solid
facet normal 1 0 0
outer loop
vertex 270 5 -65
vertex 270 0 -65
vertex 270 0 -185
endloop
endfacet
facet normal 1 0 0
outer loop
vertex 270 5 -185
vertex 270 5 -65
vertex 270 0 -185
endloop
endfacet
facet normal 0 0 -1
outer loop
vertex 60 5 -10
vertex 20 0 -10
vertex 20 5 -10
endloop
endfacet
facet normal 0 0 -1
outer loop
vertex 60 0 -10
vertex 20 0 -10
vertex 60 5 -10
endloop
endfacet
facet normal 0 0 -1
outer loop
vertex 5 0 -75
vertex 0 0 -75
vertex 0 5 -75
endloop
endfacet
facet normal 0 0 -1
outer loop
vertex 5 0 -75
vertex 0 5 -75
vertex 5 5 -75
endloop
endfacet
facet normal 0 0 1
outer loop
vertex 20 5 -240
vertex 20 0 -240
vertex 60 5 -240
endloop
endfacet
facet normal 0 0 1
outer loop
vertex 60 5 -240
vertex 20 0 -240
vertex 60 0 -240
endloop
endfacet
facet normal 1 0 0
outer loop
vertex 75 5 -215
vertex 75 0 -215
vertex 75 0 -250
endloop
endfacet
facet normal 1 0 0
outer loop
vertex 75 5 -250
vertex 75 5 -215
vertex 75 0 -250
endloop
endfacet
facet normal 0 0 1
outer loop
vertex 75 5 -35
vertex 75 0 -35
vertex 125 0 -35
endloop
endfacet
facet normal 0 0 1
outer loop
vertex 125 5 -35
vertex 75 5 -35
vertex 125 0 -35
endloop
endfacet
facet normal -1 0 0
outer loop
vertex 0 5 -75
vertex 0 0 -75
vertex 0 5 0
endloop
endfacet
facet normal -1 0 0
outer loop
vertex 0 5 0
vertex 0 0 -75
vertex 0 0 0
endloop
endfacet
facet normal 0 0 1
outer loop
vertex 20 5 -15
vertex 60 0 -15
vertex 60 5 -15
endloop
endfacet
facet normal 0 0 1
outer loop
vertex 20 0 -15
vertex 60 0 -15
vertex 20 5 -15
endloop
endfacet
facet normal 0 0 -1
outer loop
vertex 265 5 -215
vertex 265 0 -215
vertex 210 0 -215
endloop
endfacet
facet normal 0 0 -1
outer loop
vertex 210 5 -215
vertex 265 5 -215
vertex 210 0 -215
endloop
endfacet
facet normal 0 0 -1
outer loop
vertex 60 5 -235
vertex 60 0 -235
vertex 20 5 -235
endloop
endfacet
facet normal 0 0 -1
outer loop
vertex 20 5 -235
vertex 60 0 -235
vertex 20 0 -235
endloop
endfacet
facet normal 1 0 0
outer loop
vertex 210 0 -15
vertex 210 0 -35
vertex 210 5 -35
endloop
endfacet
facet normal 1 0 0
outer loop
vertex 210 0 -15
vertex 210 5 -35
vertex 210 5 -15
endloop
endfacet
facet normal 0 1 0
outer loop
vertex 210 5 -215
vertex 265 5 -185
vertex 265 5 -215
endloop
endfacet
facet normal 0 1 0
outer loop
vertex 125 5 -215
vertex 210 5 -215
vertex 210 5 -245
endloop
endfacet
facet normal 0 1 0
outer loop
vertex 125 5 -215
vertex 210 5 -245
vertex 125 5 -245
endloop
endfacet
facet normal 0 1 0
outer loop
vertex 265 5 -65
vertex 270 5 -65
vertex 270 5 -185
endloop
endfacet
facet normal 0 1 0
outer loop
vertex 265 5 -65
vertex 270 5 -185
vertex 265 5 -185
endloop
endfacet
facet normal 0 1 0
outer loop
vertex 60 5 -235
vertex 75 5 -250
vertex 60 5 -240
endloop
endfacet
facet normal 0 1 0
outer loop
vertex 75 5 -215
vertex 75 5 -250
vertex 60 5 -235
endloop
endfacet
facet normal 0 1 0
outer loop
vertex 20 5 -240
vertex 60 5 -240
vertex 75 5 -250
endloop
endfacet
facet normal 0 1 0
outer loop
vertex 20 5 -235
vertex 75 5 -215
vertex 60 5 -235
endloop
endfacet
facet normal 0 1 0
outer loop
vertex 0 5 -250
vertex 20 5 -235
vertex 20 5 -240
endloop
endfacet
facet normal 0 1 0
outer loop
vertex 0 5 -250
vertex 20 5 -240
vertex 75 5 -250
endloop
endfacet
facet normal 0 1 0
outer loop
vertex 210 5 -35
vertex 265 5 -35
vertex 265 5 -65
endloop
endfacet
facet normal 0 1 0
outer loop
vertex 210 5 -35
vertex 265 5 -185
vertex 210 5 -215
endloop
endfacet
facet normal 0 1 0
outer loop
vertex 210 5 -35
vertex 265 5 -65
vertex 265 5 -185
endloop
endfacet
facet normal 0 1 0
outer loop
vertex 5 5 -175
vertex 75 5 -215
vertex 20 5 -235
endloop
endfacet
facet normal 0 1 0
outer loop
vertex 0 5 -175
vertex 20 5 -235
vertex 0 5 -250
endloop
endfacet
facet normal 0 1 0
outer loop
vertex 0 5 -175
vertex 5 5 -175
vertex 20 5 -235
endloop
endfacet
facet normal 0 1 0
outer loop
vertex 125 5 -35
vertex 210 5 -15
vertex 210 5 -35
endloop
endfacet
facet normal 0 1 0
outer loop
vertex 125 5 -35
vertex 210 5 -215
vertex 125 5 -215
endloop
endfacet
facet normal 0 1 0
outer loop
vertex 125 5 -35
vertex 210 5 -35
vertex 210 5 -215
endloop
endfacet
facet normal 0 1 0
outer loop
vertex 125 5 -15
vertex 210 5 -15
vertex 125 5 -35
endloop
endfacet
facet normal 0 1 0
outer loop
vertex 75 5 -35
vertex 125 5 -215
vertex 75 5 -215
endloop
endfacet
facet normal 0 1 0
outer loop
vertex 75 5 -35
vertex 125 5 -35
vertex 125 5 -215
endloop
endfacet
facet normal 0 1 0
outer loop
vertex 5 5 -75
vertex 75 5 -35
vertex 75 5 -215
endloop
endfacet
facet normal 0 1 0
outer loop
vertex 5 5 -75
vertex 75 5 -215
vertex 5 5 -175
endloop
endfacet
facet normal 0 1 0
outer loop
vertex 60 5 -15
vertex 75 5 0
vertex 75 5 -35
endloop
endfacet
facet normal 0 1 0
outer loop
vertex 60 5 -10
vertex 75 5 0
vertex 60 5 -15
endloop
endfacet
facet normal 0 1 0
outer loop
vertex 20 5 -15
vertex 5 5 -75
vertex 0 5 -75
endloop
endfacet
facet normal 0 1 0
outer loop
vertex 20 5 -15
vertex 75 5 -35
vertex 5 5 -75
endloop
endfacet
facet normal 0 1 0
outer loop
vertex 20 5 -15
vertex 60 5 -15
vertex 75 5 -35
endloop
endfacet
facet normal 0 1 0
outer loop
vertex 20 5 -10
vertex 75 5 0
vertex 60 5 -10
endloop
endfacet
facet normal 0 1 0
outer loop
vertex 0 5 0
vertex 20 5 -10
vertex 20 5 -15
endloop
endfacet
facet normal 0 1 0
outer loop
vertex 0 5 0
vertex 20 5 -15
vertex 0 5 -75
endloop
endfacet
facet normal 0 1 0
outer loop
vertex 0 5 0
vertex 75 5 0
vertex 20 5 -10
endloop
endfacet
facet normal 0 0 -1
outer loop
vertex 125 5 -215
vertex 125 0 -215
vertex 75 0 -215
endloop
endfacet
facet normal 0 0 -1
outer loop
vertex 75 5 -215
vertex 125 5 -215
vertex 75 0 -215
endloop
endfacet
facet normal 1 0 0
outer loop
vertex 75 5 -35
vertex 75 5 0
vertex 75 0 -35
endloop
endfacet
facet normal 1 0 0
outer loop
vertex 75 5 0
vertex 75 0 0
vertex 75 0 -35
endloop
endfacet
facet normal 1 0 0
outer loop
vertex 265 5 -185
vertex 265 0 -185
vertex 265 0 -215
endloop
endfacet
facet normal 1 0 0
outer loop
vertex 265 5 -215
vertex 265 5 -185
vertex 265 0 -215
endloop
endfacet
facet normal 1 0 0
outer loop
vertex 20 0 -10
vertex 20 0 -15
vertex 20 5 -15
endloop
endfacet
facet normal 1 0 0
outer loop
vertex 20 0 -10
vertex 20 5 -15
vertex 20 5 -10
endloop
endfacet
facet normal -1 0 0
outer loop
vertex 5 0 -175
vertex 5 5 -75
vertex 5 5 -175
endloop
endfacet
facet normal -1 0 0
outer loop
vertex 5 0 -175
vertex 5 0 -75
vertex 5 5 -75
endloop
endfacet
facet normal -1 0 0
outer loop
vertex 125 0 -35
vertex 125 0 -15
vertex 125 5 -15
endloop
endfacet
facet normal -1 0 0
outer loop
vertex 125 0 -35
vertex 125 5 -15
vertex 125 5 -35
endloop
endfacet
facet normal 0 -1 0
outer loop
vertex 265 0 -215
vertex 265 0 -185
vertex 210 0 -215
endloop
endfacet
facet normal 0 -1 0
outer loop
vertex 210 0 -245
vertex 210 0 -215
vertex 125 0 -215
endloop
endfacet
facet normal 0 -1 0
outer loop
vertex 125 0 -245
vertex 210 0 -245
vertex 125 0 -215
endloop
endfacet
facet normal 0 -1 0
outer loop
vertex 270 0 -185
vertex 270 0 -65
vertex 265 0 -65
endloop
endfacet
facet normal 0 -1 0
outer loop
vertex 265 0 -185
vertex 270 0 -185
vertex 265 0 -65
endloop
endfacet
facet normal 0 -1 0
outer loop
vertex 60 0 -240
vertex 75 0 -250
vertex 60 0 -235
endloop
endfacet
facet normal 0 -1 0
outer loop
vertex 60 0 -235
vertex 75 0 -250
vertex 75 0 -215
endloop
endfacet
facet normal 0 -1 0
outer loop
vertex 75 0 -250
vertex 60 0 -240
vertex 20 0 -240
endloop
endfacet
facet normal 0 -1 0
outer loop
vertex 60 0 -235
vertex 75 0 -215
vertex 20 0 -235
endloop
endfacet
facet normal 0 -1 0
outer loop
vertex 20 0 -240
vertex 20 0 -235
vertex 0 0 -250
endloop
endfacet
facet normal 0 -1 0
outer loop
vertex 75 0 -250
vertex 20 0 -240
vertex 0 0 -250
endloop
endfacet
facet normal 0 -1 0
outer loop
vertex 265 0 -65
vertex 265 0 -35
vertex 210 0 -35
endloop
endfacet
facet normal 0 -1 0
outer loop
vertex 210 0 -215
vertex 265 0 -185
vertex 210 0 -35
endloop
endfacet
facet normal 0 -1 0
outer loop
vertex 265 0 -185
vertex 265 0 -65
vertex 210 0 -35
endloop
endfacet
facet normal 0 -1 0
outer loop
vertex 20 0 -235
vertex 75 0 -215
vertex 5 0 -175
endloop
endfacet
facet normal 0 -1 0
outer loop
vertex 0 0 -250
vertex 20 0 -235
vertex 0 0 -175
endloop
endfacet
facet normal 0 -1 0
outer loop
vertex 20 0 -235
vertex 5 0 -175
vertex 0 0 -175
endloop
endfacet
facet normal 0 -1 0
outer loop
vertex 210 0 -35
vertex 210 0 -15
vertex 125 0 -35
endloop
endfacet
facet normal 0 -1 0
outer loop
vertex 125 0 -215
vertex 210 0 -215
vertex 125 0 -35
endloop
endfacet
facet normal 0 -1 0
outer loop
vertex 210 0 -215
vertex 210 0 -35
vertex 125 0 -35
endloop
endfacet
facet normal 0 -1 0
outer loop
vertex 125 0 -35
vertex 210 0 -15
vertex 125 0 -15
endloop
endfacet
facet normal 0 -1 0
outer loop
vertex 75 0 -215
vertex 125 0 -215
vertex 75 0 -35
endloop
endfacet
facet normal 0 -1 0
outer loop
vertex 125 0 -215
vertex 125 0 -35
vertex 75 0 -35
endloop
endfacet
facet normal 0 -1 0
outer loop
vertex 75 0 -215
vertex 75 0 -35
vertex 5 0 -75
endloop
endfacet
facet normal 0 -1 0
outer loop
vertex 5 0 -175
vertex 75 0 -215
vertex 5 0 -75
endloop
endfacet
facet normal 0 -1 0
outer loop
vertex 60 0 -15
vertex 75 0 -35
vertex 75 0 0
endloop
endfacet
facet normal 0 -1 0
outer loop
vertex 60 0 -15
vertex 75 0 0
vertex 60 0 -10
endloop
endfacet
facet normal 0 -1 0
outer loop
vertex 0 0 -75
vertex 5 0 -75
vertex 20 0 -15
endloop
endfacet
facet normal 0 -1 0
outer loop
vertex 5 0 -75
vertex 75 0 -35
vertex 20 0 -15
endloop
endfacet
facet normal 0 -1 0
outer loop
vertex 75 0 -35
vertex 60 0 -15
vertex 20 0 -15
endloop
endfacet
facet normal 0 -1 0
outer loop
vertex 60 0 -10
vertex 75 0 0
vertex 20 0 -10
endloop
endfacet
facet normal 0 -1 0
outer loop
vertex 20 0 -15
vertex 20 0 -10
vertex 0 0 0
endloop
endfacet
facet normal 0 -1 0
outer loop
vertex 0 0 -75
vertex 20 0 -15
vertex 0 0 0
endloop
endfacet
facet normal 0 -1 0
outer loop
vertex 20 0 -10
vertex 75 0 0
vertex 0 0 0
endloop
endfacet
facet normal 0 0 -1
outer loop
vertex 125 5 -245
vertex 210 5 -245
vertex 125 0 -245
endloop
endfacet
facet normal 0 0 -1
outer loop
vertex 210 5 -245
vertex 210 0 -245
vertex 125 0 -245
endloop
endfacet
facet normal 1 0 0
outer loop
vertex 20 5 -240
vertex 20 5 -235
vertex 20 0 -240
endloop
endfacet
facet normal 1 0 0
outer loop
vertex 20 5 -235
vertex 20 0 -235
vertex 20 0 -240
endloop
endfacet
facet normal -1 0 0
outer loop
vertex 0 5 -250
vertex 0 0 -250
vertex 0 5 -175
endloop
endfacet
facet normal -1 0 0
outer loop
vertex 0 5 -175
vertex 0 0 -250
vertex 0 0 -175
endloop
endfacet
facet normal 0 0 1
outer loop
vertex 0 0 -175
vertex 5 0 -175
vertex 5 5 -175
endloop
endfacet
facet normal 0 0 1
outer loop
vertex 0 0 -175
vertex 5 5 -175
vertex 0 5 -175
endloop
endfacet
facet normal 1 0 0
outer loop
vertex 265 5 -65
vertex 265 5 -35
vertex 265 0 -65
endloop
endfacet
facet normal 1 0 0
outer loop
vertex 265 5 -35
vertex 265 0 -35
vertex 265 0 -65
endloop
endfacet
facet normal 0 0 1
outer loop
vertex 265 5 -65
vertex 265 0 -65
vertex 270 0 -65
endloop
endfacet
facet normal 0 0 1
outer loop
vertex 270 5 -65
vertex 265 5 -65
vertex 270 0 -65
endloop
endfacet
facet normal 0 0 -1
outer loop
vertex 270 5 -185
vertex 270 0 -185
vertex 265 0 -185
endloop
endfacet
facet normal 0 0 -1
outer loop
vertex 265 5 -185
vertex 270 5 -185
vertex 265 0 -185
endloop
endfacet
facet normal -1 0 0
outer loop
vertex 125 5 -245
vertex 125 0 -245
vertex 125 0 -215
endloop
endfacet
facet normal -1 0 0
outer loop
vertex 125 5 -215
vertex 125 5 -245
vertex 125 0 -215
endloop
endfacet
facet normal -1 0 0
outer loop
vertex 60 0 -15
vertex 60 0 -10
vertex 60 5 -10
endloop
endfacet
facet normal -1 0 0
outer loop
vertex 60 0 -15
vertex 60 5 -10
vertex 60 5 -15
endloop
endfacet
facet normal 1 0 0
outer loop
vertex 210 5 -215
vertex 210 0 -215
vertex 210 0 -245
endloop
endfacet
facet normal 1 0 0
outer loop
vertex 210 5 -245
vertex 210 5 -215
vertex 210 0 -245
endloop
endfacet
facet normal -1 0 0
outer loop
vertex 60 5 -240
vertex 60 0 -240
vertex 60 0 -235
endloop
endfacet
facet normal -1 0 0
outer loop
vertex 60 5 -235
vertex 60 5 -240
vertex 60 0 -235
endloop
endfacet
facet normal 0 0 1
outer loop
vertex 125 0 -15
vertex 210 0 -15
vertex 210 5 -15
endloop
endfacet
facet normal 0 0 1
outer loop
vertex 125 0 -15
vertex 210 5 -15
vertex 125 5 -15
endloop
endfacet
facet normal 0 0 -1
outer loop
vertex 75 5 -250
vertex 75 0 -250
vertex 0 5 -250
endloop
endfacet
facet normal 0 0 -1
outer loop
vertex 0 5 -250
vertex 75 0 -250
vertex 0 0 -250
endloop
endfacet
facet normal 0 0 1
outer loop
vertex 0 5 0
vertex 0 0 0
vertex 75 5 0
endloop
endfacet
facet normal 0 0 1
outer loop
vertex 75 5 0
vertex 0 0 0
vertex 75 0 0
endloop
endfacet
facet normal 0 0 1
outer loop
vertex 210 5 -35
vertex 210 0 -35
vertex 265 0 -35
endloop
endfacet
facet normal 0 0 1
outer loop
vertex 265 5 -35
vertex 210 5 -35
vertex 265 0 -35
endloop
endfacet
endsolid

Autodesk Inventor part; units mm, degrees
ref_plane "YZ Plane" through (0, 0, 0) normal (1, 0, 0) x (0, 1, 0)
ref_plane "XZ Plane" through (0, 0, 0) normal (0, 1, 0) x (-1, 0, 0)
ref_plane "XY Plane" through (0, 0, 0) normal (0, 0, 1) x (1, 0, 0)
sketch "Sketch1" plane through (0, 0, 0) normal (0, 1, 0) x (-1, 0, 0)
  line L0 (0, 0) -> (-75, 0)
  line L1 (-75, 0) -> (-75, -250)
  line L2 (-75, -250) -> (0, -250)
  line L3 (0, -250) -> (0, 0)
  line L4 (-20, -10) -> (-60, -10)
  line L5 (-60, -10) -> (-60, -15)
  line L6 (-60, -15) -> (-20, -15)
  line L7 (-20, -15) -> (-20, -10)
  line L8 (-75, -125) -> (0, -125) construction
  line L9 (-20, -240) -> (-60, -240)
  line L10 (-60, -240) -> (-60, -235)
  line L11 (-60, -235) -> (-20, -235)
  line L12 (-20, -235) -> (-20, -240)
  line L13 (-75, -35) -> (-265, -35)
  line L14 (-265, -35) -> (-265, -215)
  line L15 (-265, -215) -> (-75, -215)
  line L16 (-75, -215) -> (-75, -35)
  line L17 (-265, -65) -> (-270, -65)
  line L18 (-270, -65) -> (-270, -185)
  line L19 (-270, -185) -> (-265, -185)
  line L20 (-265, -185) -> (-265, -65)
  line L21 (0, -75) -> (-5, -75)
  line L22 (-5, -75) -> (-5, -175)
  line L23 (-5, -175) -> (0, -175)
  line L24 (0, -175) -> (0, -75)
  line L25 (-125, -35) -> (-210, -35)
  line L26 (-210, -35) -> (-210, -15)
  line L27 (-210, -15) -> (-125, -15)
  line L28 (-125, -15) -> (-125, -35)
  line L29 (-125, -215) -> (-210, -215)
  line L30 (-210, -215) -> (-210, -245)
  line L31 (-210, -245) -> (-125, -245)
  line L32 (-125, -245) -> (-125, -215)
  point P0 (-75, -215)
  point P1 (-265, -185)
  point P2 (0, -175)
  dimension "d0" = 75
  dimension "d2" = 40
  dimension "d3" = 5
  dimension "d6" = 190
  dimension "d7" = 180
  dimension "d8" = 5
  dimension "d9" = 120
  dimension "d11" = 20
  dimension "d12" = 5
  dimension "d13" = 100
  dimension "d14" = 75
  dimension "d15" = 85
  dimension "d16" = 50
  dimension "d17" = 10
  dimension "d18" = 30
  dimension "d19" = 230
  dimension "d20" = 35
extrude "Extrusion1" add sketch "Sketch1" along normal blind 5 contours L3 L21 L22 L23 L2 L1 L0 | L1 L15 L14 L13 | L13 L26 L27 L28 | L32 L31 L30 L15 | L14 L19 L18 L17
properties part number "hood"
